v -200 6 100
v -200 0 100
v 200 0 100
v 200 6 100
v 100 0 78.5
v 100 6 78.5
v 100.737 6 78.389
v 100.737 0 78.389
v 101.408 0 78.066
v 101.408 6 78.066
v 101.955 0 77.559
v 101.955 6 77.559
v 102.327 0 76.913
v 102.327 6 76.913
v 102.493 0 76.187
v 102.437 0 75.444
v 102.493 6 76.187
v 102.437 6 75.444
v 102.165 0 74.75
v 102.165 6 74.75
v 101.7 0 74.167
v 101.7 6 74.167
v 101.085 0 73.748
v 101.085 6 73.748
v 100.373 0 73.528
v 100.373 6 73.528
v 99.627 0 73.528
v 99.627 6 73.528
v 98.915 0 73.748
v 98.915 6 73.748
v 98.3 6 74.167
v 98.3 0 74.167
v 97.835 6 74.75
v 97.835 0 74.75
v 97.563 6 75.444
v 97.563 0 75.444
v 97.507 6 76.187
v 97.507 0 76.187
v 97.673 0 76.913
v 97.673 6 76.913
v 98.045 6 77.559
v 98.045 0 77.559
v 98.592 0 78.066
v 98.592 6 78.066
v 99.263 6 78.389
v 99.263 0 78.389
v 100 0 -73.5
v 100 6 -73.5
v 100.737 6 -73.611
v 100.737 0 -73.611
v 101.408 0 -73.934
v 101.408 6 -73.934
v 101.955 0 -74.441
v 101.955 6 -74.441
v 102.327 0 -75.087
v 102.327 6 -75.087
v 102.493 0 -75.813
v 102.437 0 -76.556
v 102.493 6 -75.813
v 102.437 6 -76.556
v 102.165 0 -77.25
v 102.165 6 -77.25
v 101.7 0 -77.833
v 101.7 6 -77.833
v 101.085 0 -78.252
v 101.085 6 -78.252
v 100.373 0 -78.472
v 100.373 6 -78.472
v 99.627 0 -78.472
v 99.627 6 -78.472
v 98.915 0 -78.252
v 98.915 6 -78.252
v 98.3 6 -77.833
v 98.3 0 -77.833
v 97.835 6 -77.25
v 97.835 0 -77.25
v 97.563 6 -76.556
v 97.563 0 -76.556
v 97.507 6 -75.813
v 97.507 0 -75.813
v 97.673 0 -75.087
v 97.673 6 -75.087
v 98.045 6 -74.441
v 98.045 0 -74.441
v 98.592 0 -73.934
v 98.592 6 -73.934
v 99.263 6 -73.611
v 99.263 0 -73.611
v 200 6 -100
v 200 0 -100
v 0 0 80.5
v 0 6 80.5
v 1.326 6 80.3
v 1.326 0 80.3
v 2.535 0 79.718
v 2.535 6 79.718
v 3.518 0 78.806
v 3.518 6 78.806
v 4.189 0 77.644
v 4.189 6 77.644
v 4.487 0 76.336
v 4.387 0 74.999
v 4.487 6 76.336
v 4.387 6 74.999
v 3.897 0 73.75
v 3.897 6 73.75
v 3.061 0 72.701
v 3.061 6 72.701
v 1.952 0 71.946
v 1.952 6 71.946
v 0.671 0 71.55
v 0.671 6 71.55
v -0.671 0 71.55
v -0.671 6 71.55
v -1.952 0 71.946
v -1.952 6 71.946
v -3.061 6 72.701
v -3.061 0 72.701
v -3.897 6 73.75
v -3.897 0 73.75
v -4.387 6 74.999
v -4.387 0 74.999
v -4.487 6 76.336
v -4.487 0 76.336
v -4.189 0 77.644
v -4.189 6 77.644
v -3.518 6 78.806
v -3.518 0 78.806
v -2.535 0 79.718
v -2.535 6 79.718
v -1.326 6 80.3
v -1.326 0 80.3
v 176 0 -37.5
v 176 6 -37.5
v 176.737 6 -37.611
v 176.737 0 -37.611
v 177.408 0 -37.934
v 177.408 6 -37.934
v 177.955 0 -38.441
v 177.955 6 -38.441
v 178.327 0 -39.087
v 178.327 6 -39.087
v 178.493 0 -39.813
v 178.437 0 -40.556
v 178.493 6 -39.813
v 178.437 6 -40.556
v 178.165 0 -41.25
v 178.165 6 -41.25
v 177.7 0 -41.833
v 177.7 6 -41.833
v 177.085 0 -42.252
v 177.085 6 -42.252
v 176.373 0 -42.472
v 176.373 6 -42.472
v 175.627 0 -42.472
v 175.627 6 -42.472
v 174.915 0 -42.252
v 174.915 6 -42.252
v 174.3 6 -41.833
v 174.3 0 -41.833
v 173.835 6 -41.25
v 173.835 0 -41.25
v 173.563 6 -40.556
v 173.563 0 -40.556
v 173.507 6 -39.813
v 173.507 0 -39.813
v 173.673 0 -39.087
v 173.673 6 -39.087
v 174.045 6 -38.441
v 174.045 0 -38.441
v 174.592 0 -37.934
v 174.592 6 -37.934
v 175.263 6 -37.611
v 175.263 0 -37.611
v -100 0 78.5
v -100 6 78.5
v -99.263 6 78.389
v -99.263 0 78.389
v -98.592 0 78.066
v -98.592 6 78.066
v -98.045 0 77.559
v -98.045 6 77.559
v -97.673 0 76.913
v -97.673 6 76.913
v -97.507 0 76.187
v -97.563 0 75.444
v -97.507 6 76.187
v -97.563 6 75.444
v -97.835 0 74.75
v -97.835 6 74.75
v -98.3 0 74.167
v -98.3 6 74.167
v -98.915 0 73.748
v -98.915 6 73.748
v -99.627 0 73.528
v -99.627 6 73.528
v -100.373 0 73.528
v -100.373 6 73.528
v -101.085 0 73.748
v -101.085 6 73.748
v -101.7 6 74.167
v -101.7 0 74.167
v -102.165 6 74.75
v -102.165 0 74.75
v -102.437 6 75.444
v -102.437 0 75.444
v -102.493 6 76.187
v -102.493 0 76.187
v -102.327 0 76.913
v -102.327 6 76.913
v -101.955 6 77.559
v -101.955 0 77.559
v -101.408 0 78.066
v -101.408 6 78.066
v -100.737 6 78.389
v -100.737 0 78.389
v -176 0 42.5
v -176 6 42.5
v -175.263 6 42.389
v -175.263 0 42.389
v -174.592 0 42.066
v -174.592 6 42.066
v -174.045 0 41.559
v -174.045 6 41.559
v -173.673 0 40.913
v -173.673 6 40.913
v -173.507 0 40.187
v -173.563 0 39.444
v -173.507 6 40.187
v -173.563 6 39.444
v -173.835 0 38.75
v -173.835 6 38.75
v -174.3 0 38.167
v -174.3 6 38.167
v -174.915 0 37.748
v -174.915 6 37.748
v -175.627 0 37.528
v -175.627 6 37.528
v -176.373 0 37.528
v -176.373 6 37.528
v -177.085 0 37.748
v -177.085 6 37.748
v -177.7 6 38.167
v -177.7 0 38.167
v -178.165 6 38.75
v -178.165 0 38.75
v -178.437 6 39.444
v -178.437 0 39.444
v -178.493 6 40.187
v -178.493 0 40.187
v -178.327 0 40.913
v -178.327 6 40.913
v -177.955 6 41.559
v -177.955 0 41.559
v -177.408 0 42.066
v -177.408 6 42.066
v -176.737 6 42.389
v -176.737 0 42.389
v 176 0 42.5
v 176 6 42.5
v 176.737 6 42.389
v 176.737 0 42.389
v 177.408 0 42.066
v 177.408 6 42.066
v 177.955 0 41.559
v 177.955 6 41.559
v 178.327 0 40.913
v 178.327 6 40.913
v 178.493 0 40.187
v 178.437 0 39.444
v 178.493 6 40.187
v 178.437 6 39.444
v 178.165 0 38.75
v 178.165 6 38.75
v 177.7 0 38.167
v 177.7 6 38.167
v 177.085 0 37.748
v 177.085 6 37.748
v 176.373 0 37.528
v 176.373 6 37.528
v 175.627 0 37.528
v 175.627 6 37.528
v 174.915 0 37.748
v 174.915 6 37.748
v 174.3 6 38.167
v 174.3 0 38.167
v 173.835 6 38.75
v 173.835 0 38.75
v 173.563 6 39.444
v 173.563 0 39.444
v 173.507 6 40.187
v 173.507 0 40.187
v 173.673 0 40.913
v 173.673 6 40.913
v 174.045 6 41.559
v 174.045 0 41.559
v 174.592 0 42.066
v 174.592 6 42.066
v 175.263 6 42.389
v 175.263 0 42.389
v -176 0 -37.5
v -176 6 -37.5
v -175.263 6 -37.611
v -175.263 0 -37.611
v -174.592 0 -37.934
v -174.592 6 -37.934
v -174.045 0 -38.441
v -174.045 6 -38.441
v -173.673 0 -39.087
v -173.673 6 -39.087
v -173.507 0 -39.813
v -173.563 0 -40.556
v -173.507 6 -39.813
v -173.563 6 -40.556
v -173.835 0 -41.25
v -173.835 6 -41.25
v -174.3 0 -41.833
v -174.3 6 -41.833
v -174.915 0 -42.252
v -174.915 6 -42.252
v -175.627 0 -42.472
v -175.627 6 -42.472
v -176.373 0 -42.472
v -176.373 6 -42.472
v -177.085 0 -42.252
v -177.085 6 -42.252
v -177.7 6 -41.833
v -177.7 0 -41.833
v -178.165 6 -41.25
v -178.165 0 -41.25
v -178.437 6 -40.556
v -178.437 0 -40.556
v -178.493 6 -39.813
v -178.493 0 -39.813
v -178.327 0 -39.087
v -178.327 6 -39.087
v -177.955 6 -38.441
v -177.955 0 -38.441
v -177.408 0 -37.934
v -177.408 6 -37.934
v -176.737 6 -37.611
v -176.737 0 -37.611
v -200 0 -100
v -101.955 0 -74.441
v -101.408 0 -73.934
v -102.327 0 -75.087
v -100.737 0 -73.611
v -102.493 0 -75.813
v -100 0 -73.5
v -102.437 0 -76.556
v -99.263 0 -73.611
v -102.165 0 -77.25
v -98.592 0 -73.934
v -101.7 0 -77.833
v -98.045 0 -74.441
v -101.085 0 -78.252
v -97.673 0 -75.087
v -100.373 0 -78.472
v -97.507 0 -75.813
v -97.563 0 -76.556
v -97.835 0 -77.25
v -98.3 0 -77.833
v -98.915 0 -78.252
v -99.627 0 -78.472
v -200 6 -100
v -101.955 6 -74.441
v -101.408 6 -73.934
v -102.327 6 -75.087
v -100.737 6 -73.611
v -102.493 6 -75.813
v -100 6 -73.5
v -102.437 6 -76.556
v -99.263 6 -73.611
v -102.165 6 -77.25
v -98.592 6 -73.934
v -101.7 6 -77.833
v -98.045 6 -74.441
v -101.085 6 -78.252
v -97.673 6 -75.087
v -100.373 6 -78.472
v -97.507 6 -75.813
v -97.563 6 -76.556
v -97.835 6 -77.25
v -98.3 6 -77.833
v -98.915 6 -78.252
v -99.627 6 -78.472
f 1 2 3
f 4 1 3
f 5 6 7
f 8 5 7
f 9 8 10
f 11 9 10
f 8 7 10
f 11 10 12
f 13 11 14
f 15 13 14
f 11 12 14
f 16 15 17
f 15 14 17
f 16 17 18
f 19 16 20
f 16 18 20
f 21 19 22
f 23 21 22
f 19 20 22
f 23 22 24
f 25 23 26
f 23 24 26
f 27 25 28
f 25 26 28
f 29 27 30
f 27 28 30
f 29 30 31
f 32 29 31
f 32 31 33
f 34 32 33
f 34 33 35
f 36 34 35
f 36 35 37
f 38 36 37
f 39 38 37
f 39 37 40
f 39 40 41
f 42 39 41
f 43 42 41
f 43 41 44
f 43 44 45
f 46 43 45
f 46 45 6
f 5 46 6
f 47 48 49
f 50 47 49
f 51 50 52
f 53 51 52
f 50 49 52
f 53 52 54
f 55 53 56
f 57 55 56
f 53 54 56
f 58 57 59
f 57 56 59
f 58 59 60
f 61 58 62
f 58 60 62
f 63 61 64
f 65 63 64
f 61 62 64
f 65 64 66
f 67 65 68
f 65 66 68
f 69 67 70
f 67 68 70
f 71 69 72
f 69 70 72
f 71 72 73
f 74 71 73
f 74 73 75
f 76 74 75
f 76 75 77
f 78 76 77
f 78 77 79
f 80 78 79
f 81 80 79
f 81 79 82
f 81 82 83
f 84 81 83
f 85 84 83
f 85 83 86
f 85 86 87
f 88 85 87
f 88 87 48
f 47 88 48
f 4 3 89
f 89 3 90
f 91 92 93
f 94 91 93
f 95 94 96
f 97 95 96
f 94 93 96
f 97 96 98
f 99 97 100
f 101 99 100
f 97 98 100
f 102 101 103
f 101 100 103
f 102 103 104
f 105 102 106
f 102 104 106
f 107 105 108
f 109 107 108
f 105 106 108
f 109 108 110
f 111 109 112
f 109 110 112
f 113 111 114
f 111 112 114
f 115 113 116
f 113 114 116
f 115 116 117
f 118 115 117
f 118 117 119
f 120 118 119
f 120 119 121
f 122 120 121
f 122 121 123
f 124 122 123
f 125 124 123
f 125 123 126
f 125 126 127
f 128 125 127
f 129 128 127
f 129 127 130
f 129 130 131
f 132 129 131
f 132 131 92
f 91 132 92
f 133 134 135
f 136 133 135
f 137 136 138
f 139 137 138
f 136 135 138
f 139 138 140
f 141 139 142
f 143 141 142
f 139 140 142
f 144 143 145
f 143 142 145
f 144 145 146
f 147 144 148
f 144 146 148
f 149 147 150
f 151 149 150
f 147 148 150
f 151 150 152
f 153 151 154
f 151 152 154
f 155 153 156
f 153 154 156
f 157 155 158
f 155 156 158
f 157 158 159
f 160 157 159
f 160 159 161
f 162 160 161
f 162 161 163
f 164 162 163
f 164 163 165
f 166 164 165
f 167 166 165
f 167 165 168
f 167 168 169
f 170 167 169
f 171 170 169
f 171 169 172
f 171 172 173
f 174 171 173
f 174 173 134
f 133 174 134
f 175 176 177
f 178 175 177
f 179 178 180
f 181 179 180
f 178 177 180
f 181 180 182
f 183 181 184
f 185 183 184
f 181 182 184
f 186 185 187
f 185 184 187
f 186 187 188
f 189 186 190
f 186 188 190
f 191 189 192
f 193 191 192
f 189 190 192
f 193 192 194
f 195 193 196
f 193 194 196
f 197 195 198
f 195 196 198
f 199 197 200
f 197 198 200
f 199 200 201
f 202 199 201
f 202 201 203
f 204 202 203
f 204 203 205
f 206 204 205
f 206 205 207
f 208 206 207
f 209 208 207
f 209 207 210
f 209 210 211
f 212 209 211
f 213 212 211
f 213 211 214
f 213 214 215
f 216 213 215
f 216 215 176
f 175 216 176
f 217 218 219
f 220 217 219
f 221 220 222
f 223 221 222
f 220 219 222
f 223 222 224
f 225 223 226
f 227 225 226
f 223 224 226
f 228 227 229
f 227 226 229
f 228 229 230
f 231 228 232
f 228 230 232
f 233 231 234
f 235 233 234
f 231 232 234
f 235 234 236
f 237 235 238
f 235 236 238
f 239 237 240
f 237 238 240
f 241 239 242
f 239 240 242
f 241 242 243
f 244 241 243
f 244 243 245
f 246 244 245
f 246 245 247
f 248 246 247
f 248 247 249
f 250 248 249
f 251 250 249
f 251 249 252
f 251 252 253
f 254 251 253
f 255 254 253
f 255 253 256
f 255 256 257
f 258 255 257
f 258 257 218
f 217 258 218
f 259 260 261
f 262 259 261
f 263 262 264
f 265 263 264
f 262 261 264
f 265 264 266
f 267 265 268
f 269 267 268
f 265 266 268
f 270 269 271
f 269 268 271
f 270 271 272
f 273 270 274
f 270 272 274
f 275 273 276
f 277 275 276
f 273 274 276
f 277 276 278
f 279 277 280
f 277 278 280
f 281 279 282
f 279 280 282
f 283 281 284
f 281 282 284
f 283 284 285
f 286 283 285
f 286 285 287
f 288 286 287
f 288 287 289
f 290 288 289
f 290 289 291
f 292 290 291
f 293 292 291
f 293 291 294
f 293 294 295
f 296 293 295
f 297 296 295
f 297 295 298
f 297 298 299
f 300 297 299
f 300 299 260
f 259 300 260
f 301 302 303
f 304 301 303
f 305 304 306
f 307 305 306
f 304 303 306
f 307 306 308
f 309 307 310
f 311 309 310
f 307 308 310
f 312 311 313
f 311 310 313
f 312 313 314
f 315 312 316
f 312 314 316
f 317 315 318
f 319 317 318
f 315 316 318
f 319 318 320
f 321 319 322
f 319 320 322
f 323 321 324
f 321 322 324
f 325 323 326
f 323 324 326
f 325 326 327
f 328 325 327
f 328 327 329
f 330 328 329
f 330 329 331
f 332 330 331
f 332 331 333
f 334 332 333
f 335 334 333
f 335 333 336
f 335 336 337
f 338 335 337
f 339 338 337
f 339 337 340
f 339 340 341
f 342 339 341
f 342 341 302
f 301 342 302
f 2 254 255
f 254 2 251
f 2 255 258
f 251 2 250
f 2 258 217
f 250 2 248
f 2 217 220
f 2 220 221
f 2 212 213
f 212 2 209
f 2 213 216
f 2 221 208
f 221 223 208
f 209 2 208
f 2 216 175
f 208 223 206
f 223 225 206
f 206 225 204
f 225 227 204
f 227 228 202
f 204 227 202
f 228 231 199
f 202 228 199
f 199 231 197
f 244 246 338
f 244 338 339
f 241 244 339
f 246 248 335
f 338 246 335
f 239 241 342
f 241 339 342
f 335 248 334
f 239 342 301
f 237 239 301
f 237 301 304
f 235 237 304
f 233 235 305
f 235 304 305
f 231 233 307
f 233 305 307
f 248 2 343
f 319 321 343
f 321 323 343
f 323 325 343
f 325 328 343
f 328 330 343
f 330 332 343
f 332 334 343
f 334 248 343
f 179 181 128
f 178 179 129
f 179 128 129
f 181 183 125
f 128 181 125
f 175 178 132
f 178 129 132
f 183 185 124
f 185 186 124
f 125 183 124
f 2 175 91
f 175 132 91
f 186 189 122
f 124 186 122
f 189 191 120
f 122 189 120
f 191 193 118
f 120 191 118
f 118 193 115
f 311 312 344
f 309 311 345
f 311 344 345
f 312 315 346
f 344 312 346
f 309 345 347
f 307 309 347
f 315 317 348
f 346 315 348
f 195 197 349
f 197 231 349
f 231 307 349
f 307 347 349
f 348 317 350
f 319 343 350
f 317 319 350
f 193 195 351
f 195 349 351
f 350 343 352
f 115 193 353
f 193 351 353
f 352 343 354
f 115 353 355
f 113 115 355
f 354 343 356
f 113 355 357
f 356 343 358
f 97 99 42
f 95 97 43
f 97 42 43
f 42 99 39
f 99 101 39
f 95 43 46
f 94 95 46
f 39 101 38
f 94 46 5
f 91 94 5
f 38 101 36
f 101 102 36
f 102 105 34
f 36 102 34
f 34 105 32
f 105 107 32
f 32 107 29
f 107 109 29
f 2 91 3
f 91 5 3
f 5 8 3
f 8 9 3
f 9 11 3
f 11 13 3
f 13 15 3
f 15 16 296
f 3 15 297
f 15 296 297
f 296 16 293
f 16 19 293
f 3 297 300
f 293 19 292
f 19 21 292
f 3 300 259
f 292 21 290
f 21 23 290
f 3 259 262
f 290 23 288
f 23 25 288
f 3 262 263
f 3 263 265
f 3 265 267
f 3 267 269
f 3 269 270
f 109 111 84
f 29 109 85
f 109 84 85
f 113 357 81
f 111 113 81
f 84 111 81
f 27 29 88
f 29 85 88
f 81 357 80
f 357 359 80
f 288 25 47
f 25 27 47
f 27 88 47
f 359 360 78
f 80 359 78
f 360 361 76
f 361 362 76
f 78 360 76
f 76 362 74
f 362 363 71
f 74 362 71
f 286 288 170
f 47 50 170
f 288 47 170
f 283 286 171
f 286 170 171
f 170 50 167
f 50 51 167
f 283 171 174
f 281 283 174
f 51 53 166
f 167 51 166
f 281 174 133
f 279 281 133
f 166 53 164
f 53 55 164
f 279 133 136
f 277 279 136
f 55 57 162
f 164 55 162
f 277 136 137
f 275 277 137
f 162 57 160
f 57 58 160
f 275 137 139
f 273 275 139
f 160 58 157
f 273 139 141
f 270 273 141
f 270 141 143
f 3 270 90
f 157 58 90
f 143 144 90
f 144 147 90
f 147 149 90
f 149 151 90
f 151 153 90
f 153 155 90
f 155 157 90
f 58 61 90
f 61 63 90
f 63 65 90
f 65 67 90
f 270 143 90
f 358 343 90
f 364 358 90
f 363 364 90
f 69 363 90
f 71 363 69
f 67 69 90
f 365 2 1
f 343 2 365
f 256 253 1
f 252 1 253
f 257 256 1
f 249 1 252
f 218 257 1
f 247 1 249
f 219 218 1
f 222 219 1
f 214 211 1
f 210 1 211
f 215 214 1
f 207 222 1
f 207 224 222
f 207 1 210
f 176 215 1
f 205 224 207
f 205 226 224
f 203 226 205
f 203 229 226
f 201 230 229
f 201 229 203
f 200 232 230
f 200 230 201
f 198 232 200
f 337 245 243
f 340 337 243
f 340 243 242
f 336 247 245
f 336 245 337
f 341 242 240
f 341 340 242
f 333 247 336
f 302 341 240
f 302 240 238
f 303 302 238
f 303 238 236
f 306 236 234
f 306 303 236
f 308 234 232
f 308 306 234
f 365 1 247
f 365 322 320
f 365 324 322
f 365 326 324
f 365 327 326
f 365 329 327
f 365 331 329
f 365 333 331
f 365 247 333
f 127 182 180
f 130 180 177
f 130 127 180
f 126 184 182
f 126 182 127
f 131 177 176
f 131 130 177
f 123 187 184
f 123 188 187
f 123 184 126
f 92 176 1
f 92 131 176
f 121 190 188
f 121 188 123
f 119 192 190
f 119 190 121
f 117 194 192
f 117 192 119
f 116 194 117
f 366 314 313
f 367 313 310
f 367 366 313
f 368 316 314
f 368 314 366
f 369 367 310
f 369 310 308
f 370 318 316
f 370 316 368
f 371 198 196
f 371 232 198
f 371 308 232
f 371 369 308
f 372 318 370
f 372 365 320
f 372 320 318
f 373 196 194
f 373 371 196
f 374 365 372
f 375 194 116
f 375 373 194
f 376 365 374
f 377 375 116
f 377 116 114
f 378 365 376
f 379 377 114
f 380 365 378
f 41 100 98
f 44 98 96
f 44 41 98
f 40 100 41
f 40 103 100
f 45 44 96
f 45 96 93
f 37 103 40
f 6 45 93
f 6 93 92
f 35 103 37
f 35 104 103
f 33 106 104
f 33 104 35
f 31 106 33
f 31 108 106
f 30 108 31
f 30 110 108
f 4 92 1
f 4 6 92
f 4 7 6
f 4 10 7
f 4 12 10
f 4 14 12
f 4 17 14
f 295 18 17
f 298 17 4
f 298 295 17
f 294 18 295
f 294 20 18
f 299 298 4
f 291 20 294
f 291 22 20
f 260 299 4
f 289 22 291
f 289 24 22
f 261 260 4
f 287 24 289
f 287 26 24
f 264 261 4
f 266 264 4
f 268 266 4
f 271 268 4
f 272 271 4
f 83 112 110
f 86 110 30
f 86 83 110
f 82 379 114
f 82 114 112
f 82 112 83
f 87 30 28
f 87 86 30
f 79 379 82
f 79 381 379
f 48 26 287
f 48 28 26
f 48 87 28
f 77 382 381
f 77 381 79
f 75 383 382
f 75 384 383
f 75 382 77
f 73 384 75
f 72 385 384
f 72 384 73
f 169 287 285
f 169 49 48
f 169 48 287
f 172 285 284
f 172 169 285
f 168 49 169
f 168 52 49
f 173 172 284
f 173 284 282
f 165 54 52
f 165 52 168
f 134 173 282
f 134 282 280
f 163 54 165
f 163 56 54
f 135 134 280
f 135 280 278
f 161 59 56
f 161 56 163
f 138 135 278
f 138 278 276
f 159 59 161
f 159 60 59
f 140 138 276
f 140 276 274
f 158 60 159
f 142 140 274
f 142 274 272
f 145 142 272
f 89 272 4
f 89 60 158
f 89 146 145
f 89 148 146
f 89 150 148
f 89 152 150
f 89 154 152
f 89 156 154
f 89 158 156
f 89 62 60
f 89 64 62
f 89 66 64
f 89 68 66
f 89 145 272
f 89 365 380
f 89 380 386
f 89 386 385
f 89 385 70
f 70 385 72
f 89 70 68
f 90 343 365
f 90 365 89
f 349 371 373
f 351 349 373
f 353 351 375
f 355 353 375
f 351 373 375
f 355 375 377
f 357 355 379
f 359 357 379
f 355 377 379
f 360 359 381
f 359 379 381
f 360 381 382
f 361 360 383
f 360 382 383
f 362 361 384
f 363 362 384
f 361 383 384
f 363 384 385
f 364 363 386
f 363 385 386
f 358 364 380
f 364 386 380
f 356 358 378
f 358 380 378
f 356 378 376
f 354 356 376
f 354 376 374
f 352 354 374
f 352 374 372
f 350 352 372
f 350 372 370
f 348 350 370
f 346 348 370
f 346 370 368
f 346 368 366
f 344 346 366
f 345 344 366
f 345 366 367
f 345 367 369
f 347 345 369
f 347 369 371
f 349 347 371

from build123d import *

# Parameters (mm, degrees)
ESQUISSE1_W             = 400
ESQUISSE1_H             = 200
BOSS_EXTRU_1_DEPTH      = 6
ESQUISSE2_R             = 2.5
ENL_V_MAT_EXTRU_1_DEPTH = 224.687281713
ESQUISSE3_R             = 4.5
ENL_V_MAT_EXTRU_2_DEPTH = 224.687281713


with BuildPart() as part:
    # Esquisse1 → Boss.-Extru.1 (new body)
    with BuildSketch(Plane(origin=(0, 0, 0), x_dir=(1, 0, 0), z_dir=(0, 1, 0))):
        Rectangle(ESQUISSE1_W, ESQUISSE1_H)
    extrude(amount=BOSS_EXTRU_1_DEPTH)

    # Esquisse2 → Enlèv. mat.-Extru.1 (cut, through all)
    with BuildSketch(Plane(origin=(0, 6, 0), x_dir=(1, 0, 0), z_dir=(0, 1, 0))):
        with Locations(Location((-100, 76, 0), (0, 0, 270))):
            Circle(ESQUISSE2_R)
        with Locations(Location((100, 76, 0), (0, 0, 270))):
            Circle(ESQUISSE2_R)
        with Locations(Location((100, -76, 0), (0, 0, 270))):
            Circle(ESQUISSE2_R)
        with Locations(Location((-100, -76, 0), (0, 0, 270))):
            Circle(ESQUISSE2_R)
        with Locations(Location((-176, 40, 0), (0, 0, 270))):
            Circle(ESQUISSE2_R)
        with Locations(Location((-176, -40, 0), (0, 0, 270))):
            Circle(ESQUISSE2_R)
        with Locations(Location((176, -40, 0), (0, 0, 270))):
            Circle(ESQUISSE2_R)
        with Locations(Location((176, 40, 0), (0, 0, 270))):
            Circle(ESQUISSE2_R)
    extrude(amount=-ENL_V_MAT_EXTRU_1_DEPTH, mode=Mode.SUBTRACT)

    # Esquisse3 → Enlèv. mat.-Extru.2 (cut, through all)
    with BuildSketch(Plane(origin=(0, 6, 0), x_dir=(1, 0, 0), z_dir=(0, 1, 0))):
        with Locations(Location((0, -76, 0), (0, 0, 270))):
            Circle(ESQUISSE3_R)
    extrude(amount=-ENL_V_MAT_EXTRU_2_DEPTH, mode=Mode.SUBTRACT)


solid = part.part
